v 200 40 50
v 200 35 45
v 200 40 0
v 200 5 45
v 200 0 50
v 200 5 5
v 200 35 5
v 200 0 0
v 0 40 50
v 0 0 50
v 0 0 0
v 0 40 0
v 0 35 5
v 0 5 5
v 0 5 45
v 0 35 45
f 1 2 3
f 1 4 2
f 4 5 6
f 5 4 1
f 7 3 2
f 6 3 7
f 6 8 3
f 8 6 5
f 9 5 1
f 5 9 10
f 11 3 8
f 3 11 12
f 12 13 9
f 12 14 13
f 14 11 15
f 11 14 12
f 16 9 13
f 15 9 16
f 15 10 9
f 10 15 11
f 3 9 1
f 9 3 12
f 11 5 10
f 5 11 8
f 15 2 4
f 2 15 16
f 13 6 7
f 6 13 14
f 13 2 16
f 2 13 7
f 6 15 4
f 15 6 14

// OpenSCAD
$fn = 32;

// ----------------------------------------------------------------------
// Box beam: 200-250 mm hollow beam
// ----------------------------------------------------------------------

// --- parameters (mm) ---
beam_l = 200;             // beam length, X
beam_w = 40;              // beam width, Y
beam_h = 50;              // beam height, Z
wall = 5;                 // wall thickness
fit_tol = 0.05;           // tolerance for press fits, mm
free_tol = 0.2;           // tolerance for clearance fits, mm

difference() {
  cube([beam_l, beam_w, beam_h]);
  translate([-1, wall, wall])
    cube([beam_l + 2, beam_w - 2 * wall, beam_h - 2 * wall]);
}
